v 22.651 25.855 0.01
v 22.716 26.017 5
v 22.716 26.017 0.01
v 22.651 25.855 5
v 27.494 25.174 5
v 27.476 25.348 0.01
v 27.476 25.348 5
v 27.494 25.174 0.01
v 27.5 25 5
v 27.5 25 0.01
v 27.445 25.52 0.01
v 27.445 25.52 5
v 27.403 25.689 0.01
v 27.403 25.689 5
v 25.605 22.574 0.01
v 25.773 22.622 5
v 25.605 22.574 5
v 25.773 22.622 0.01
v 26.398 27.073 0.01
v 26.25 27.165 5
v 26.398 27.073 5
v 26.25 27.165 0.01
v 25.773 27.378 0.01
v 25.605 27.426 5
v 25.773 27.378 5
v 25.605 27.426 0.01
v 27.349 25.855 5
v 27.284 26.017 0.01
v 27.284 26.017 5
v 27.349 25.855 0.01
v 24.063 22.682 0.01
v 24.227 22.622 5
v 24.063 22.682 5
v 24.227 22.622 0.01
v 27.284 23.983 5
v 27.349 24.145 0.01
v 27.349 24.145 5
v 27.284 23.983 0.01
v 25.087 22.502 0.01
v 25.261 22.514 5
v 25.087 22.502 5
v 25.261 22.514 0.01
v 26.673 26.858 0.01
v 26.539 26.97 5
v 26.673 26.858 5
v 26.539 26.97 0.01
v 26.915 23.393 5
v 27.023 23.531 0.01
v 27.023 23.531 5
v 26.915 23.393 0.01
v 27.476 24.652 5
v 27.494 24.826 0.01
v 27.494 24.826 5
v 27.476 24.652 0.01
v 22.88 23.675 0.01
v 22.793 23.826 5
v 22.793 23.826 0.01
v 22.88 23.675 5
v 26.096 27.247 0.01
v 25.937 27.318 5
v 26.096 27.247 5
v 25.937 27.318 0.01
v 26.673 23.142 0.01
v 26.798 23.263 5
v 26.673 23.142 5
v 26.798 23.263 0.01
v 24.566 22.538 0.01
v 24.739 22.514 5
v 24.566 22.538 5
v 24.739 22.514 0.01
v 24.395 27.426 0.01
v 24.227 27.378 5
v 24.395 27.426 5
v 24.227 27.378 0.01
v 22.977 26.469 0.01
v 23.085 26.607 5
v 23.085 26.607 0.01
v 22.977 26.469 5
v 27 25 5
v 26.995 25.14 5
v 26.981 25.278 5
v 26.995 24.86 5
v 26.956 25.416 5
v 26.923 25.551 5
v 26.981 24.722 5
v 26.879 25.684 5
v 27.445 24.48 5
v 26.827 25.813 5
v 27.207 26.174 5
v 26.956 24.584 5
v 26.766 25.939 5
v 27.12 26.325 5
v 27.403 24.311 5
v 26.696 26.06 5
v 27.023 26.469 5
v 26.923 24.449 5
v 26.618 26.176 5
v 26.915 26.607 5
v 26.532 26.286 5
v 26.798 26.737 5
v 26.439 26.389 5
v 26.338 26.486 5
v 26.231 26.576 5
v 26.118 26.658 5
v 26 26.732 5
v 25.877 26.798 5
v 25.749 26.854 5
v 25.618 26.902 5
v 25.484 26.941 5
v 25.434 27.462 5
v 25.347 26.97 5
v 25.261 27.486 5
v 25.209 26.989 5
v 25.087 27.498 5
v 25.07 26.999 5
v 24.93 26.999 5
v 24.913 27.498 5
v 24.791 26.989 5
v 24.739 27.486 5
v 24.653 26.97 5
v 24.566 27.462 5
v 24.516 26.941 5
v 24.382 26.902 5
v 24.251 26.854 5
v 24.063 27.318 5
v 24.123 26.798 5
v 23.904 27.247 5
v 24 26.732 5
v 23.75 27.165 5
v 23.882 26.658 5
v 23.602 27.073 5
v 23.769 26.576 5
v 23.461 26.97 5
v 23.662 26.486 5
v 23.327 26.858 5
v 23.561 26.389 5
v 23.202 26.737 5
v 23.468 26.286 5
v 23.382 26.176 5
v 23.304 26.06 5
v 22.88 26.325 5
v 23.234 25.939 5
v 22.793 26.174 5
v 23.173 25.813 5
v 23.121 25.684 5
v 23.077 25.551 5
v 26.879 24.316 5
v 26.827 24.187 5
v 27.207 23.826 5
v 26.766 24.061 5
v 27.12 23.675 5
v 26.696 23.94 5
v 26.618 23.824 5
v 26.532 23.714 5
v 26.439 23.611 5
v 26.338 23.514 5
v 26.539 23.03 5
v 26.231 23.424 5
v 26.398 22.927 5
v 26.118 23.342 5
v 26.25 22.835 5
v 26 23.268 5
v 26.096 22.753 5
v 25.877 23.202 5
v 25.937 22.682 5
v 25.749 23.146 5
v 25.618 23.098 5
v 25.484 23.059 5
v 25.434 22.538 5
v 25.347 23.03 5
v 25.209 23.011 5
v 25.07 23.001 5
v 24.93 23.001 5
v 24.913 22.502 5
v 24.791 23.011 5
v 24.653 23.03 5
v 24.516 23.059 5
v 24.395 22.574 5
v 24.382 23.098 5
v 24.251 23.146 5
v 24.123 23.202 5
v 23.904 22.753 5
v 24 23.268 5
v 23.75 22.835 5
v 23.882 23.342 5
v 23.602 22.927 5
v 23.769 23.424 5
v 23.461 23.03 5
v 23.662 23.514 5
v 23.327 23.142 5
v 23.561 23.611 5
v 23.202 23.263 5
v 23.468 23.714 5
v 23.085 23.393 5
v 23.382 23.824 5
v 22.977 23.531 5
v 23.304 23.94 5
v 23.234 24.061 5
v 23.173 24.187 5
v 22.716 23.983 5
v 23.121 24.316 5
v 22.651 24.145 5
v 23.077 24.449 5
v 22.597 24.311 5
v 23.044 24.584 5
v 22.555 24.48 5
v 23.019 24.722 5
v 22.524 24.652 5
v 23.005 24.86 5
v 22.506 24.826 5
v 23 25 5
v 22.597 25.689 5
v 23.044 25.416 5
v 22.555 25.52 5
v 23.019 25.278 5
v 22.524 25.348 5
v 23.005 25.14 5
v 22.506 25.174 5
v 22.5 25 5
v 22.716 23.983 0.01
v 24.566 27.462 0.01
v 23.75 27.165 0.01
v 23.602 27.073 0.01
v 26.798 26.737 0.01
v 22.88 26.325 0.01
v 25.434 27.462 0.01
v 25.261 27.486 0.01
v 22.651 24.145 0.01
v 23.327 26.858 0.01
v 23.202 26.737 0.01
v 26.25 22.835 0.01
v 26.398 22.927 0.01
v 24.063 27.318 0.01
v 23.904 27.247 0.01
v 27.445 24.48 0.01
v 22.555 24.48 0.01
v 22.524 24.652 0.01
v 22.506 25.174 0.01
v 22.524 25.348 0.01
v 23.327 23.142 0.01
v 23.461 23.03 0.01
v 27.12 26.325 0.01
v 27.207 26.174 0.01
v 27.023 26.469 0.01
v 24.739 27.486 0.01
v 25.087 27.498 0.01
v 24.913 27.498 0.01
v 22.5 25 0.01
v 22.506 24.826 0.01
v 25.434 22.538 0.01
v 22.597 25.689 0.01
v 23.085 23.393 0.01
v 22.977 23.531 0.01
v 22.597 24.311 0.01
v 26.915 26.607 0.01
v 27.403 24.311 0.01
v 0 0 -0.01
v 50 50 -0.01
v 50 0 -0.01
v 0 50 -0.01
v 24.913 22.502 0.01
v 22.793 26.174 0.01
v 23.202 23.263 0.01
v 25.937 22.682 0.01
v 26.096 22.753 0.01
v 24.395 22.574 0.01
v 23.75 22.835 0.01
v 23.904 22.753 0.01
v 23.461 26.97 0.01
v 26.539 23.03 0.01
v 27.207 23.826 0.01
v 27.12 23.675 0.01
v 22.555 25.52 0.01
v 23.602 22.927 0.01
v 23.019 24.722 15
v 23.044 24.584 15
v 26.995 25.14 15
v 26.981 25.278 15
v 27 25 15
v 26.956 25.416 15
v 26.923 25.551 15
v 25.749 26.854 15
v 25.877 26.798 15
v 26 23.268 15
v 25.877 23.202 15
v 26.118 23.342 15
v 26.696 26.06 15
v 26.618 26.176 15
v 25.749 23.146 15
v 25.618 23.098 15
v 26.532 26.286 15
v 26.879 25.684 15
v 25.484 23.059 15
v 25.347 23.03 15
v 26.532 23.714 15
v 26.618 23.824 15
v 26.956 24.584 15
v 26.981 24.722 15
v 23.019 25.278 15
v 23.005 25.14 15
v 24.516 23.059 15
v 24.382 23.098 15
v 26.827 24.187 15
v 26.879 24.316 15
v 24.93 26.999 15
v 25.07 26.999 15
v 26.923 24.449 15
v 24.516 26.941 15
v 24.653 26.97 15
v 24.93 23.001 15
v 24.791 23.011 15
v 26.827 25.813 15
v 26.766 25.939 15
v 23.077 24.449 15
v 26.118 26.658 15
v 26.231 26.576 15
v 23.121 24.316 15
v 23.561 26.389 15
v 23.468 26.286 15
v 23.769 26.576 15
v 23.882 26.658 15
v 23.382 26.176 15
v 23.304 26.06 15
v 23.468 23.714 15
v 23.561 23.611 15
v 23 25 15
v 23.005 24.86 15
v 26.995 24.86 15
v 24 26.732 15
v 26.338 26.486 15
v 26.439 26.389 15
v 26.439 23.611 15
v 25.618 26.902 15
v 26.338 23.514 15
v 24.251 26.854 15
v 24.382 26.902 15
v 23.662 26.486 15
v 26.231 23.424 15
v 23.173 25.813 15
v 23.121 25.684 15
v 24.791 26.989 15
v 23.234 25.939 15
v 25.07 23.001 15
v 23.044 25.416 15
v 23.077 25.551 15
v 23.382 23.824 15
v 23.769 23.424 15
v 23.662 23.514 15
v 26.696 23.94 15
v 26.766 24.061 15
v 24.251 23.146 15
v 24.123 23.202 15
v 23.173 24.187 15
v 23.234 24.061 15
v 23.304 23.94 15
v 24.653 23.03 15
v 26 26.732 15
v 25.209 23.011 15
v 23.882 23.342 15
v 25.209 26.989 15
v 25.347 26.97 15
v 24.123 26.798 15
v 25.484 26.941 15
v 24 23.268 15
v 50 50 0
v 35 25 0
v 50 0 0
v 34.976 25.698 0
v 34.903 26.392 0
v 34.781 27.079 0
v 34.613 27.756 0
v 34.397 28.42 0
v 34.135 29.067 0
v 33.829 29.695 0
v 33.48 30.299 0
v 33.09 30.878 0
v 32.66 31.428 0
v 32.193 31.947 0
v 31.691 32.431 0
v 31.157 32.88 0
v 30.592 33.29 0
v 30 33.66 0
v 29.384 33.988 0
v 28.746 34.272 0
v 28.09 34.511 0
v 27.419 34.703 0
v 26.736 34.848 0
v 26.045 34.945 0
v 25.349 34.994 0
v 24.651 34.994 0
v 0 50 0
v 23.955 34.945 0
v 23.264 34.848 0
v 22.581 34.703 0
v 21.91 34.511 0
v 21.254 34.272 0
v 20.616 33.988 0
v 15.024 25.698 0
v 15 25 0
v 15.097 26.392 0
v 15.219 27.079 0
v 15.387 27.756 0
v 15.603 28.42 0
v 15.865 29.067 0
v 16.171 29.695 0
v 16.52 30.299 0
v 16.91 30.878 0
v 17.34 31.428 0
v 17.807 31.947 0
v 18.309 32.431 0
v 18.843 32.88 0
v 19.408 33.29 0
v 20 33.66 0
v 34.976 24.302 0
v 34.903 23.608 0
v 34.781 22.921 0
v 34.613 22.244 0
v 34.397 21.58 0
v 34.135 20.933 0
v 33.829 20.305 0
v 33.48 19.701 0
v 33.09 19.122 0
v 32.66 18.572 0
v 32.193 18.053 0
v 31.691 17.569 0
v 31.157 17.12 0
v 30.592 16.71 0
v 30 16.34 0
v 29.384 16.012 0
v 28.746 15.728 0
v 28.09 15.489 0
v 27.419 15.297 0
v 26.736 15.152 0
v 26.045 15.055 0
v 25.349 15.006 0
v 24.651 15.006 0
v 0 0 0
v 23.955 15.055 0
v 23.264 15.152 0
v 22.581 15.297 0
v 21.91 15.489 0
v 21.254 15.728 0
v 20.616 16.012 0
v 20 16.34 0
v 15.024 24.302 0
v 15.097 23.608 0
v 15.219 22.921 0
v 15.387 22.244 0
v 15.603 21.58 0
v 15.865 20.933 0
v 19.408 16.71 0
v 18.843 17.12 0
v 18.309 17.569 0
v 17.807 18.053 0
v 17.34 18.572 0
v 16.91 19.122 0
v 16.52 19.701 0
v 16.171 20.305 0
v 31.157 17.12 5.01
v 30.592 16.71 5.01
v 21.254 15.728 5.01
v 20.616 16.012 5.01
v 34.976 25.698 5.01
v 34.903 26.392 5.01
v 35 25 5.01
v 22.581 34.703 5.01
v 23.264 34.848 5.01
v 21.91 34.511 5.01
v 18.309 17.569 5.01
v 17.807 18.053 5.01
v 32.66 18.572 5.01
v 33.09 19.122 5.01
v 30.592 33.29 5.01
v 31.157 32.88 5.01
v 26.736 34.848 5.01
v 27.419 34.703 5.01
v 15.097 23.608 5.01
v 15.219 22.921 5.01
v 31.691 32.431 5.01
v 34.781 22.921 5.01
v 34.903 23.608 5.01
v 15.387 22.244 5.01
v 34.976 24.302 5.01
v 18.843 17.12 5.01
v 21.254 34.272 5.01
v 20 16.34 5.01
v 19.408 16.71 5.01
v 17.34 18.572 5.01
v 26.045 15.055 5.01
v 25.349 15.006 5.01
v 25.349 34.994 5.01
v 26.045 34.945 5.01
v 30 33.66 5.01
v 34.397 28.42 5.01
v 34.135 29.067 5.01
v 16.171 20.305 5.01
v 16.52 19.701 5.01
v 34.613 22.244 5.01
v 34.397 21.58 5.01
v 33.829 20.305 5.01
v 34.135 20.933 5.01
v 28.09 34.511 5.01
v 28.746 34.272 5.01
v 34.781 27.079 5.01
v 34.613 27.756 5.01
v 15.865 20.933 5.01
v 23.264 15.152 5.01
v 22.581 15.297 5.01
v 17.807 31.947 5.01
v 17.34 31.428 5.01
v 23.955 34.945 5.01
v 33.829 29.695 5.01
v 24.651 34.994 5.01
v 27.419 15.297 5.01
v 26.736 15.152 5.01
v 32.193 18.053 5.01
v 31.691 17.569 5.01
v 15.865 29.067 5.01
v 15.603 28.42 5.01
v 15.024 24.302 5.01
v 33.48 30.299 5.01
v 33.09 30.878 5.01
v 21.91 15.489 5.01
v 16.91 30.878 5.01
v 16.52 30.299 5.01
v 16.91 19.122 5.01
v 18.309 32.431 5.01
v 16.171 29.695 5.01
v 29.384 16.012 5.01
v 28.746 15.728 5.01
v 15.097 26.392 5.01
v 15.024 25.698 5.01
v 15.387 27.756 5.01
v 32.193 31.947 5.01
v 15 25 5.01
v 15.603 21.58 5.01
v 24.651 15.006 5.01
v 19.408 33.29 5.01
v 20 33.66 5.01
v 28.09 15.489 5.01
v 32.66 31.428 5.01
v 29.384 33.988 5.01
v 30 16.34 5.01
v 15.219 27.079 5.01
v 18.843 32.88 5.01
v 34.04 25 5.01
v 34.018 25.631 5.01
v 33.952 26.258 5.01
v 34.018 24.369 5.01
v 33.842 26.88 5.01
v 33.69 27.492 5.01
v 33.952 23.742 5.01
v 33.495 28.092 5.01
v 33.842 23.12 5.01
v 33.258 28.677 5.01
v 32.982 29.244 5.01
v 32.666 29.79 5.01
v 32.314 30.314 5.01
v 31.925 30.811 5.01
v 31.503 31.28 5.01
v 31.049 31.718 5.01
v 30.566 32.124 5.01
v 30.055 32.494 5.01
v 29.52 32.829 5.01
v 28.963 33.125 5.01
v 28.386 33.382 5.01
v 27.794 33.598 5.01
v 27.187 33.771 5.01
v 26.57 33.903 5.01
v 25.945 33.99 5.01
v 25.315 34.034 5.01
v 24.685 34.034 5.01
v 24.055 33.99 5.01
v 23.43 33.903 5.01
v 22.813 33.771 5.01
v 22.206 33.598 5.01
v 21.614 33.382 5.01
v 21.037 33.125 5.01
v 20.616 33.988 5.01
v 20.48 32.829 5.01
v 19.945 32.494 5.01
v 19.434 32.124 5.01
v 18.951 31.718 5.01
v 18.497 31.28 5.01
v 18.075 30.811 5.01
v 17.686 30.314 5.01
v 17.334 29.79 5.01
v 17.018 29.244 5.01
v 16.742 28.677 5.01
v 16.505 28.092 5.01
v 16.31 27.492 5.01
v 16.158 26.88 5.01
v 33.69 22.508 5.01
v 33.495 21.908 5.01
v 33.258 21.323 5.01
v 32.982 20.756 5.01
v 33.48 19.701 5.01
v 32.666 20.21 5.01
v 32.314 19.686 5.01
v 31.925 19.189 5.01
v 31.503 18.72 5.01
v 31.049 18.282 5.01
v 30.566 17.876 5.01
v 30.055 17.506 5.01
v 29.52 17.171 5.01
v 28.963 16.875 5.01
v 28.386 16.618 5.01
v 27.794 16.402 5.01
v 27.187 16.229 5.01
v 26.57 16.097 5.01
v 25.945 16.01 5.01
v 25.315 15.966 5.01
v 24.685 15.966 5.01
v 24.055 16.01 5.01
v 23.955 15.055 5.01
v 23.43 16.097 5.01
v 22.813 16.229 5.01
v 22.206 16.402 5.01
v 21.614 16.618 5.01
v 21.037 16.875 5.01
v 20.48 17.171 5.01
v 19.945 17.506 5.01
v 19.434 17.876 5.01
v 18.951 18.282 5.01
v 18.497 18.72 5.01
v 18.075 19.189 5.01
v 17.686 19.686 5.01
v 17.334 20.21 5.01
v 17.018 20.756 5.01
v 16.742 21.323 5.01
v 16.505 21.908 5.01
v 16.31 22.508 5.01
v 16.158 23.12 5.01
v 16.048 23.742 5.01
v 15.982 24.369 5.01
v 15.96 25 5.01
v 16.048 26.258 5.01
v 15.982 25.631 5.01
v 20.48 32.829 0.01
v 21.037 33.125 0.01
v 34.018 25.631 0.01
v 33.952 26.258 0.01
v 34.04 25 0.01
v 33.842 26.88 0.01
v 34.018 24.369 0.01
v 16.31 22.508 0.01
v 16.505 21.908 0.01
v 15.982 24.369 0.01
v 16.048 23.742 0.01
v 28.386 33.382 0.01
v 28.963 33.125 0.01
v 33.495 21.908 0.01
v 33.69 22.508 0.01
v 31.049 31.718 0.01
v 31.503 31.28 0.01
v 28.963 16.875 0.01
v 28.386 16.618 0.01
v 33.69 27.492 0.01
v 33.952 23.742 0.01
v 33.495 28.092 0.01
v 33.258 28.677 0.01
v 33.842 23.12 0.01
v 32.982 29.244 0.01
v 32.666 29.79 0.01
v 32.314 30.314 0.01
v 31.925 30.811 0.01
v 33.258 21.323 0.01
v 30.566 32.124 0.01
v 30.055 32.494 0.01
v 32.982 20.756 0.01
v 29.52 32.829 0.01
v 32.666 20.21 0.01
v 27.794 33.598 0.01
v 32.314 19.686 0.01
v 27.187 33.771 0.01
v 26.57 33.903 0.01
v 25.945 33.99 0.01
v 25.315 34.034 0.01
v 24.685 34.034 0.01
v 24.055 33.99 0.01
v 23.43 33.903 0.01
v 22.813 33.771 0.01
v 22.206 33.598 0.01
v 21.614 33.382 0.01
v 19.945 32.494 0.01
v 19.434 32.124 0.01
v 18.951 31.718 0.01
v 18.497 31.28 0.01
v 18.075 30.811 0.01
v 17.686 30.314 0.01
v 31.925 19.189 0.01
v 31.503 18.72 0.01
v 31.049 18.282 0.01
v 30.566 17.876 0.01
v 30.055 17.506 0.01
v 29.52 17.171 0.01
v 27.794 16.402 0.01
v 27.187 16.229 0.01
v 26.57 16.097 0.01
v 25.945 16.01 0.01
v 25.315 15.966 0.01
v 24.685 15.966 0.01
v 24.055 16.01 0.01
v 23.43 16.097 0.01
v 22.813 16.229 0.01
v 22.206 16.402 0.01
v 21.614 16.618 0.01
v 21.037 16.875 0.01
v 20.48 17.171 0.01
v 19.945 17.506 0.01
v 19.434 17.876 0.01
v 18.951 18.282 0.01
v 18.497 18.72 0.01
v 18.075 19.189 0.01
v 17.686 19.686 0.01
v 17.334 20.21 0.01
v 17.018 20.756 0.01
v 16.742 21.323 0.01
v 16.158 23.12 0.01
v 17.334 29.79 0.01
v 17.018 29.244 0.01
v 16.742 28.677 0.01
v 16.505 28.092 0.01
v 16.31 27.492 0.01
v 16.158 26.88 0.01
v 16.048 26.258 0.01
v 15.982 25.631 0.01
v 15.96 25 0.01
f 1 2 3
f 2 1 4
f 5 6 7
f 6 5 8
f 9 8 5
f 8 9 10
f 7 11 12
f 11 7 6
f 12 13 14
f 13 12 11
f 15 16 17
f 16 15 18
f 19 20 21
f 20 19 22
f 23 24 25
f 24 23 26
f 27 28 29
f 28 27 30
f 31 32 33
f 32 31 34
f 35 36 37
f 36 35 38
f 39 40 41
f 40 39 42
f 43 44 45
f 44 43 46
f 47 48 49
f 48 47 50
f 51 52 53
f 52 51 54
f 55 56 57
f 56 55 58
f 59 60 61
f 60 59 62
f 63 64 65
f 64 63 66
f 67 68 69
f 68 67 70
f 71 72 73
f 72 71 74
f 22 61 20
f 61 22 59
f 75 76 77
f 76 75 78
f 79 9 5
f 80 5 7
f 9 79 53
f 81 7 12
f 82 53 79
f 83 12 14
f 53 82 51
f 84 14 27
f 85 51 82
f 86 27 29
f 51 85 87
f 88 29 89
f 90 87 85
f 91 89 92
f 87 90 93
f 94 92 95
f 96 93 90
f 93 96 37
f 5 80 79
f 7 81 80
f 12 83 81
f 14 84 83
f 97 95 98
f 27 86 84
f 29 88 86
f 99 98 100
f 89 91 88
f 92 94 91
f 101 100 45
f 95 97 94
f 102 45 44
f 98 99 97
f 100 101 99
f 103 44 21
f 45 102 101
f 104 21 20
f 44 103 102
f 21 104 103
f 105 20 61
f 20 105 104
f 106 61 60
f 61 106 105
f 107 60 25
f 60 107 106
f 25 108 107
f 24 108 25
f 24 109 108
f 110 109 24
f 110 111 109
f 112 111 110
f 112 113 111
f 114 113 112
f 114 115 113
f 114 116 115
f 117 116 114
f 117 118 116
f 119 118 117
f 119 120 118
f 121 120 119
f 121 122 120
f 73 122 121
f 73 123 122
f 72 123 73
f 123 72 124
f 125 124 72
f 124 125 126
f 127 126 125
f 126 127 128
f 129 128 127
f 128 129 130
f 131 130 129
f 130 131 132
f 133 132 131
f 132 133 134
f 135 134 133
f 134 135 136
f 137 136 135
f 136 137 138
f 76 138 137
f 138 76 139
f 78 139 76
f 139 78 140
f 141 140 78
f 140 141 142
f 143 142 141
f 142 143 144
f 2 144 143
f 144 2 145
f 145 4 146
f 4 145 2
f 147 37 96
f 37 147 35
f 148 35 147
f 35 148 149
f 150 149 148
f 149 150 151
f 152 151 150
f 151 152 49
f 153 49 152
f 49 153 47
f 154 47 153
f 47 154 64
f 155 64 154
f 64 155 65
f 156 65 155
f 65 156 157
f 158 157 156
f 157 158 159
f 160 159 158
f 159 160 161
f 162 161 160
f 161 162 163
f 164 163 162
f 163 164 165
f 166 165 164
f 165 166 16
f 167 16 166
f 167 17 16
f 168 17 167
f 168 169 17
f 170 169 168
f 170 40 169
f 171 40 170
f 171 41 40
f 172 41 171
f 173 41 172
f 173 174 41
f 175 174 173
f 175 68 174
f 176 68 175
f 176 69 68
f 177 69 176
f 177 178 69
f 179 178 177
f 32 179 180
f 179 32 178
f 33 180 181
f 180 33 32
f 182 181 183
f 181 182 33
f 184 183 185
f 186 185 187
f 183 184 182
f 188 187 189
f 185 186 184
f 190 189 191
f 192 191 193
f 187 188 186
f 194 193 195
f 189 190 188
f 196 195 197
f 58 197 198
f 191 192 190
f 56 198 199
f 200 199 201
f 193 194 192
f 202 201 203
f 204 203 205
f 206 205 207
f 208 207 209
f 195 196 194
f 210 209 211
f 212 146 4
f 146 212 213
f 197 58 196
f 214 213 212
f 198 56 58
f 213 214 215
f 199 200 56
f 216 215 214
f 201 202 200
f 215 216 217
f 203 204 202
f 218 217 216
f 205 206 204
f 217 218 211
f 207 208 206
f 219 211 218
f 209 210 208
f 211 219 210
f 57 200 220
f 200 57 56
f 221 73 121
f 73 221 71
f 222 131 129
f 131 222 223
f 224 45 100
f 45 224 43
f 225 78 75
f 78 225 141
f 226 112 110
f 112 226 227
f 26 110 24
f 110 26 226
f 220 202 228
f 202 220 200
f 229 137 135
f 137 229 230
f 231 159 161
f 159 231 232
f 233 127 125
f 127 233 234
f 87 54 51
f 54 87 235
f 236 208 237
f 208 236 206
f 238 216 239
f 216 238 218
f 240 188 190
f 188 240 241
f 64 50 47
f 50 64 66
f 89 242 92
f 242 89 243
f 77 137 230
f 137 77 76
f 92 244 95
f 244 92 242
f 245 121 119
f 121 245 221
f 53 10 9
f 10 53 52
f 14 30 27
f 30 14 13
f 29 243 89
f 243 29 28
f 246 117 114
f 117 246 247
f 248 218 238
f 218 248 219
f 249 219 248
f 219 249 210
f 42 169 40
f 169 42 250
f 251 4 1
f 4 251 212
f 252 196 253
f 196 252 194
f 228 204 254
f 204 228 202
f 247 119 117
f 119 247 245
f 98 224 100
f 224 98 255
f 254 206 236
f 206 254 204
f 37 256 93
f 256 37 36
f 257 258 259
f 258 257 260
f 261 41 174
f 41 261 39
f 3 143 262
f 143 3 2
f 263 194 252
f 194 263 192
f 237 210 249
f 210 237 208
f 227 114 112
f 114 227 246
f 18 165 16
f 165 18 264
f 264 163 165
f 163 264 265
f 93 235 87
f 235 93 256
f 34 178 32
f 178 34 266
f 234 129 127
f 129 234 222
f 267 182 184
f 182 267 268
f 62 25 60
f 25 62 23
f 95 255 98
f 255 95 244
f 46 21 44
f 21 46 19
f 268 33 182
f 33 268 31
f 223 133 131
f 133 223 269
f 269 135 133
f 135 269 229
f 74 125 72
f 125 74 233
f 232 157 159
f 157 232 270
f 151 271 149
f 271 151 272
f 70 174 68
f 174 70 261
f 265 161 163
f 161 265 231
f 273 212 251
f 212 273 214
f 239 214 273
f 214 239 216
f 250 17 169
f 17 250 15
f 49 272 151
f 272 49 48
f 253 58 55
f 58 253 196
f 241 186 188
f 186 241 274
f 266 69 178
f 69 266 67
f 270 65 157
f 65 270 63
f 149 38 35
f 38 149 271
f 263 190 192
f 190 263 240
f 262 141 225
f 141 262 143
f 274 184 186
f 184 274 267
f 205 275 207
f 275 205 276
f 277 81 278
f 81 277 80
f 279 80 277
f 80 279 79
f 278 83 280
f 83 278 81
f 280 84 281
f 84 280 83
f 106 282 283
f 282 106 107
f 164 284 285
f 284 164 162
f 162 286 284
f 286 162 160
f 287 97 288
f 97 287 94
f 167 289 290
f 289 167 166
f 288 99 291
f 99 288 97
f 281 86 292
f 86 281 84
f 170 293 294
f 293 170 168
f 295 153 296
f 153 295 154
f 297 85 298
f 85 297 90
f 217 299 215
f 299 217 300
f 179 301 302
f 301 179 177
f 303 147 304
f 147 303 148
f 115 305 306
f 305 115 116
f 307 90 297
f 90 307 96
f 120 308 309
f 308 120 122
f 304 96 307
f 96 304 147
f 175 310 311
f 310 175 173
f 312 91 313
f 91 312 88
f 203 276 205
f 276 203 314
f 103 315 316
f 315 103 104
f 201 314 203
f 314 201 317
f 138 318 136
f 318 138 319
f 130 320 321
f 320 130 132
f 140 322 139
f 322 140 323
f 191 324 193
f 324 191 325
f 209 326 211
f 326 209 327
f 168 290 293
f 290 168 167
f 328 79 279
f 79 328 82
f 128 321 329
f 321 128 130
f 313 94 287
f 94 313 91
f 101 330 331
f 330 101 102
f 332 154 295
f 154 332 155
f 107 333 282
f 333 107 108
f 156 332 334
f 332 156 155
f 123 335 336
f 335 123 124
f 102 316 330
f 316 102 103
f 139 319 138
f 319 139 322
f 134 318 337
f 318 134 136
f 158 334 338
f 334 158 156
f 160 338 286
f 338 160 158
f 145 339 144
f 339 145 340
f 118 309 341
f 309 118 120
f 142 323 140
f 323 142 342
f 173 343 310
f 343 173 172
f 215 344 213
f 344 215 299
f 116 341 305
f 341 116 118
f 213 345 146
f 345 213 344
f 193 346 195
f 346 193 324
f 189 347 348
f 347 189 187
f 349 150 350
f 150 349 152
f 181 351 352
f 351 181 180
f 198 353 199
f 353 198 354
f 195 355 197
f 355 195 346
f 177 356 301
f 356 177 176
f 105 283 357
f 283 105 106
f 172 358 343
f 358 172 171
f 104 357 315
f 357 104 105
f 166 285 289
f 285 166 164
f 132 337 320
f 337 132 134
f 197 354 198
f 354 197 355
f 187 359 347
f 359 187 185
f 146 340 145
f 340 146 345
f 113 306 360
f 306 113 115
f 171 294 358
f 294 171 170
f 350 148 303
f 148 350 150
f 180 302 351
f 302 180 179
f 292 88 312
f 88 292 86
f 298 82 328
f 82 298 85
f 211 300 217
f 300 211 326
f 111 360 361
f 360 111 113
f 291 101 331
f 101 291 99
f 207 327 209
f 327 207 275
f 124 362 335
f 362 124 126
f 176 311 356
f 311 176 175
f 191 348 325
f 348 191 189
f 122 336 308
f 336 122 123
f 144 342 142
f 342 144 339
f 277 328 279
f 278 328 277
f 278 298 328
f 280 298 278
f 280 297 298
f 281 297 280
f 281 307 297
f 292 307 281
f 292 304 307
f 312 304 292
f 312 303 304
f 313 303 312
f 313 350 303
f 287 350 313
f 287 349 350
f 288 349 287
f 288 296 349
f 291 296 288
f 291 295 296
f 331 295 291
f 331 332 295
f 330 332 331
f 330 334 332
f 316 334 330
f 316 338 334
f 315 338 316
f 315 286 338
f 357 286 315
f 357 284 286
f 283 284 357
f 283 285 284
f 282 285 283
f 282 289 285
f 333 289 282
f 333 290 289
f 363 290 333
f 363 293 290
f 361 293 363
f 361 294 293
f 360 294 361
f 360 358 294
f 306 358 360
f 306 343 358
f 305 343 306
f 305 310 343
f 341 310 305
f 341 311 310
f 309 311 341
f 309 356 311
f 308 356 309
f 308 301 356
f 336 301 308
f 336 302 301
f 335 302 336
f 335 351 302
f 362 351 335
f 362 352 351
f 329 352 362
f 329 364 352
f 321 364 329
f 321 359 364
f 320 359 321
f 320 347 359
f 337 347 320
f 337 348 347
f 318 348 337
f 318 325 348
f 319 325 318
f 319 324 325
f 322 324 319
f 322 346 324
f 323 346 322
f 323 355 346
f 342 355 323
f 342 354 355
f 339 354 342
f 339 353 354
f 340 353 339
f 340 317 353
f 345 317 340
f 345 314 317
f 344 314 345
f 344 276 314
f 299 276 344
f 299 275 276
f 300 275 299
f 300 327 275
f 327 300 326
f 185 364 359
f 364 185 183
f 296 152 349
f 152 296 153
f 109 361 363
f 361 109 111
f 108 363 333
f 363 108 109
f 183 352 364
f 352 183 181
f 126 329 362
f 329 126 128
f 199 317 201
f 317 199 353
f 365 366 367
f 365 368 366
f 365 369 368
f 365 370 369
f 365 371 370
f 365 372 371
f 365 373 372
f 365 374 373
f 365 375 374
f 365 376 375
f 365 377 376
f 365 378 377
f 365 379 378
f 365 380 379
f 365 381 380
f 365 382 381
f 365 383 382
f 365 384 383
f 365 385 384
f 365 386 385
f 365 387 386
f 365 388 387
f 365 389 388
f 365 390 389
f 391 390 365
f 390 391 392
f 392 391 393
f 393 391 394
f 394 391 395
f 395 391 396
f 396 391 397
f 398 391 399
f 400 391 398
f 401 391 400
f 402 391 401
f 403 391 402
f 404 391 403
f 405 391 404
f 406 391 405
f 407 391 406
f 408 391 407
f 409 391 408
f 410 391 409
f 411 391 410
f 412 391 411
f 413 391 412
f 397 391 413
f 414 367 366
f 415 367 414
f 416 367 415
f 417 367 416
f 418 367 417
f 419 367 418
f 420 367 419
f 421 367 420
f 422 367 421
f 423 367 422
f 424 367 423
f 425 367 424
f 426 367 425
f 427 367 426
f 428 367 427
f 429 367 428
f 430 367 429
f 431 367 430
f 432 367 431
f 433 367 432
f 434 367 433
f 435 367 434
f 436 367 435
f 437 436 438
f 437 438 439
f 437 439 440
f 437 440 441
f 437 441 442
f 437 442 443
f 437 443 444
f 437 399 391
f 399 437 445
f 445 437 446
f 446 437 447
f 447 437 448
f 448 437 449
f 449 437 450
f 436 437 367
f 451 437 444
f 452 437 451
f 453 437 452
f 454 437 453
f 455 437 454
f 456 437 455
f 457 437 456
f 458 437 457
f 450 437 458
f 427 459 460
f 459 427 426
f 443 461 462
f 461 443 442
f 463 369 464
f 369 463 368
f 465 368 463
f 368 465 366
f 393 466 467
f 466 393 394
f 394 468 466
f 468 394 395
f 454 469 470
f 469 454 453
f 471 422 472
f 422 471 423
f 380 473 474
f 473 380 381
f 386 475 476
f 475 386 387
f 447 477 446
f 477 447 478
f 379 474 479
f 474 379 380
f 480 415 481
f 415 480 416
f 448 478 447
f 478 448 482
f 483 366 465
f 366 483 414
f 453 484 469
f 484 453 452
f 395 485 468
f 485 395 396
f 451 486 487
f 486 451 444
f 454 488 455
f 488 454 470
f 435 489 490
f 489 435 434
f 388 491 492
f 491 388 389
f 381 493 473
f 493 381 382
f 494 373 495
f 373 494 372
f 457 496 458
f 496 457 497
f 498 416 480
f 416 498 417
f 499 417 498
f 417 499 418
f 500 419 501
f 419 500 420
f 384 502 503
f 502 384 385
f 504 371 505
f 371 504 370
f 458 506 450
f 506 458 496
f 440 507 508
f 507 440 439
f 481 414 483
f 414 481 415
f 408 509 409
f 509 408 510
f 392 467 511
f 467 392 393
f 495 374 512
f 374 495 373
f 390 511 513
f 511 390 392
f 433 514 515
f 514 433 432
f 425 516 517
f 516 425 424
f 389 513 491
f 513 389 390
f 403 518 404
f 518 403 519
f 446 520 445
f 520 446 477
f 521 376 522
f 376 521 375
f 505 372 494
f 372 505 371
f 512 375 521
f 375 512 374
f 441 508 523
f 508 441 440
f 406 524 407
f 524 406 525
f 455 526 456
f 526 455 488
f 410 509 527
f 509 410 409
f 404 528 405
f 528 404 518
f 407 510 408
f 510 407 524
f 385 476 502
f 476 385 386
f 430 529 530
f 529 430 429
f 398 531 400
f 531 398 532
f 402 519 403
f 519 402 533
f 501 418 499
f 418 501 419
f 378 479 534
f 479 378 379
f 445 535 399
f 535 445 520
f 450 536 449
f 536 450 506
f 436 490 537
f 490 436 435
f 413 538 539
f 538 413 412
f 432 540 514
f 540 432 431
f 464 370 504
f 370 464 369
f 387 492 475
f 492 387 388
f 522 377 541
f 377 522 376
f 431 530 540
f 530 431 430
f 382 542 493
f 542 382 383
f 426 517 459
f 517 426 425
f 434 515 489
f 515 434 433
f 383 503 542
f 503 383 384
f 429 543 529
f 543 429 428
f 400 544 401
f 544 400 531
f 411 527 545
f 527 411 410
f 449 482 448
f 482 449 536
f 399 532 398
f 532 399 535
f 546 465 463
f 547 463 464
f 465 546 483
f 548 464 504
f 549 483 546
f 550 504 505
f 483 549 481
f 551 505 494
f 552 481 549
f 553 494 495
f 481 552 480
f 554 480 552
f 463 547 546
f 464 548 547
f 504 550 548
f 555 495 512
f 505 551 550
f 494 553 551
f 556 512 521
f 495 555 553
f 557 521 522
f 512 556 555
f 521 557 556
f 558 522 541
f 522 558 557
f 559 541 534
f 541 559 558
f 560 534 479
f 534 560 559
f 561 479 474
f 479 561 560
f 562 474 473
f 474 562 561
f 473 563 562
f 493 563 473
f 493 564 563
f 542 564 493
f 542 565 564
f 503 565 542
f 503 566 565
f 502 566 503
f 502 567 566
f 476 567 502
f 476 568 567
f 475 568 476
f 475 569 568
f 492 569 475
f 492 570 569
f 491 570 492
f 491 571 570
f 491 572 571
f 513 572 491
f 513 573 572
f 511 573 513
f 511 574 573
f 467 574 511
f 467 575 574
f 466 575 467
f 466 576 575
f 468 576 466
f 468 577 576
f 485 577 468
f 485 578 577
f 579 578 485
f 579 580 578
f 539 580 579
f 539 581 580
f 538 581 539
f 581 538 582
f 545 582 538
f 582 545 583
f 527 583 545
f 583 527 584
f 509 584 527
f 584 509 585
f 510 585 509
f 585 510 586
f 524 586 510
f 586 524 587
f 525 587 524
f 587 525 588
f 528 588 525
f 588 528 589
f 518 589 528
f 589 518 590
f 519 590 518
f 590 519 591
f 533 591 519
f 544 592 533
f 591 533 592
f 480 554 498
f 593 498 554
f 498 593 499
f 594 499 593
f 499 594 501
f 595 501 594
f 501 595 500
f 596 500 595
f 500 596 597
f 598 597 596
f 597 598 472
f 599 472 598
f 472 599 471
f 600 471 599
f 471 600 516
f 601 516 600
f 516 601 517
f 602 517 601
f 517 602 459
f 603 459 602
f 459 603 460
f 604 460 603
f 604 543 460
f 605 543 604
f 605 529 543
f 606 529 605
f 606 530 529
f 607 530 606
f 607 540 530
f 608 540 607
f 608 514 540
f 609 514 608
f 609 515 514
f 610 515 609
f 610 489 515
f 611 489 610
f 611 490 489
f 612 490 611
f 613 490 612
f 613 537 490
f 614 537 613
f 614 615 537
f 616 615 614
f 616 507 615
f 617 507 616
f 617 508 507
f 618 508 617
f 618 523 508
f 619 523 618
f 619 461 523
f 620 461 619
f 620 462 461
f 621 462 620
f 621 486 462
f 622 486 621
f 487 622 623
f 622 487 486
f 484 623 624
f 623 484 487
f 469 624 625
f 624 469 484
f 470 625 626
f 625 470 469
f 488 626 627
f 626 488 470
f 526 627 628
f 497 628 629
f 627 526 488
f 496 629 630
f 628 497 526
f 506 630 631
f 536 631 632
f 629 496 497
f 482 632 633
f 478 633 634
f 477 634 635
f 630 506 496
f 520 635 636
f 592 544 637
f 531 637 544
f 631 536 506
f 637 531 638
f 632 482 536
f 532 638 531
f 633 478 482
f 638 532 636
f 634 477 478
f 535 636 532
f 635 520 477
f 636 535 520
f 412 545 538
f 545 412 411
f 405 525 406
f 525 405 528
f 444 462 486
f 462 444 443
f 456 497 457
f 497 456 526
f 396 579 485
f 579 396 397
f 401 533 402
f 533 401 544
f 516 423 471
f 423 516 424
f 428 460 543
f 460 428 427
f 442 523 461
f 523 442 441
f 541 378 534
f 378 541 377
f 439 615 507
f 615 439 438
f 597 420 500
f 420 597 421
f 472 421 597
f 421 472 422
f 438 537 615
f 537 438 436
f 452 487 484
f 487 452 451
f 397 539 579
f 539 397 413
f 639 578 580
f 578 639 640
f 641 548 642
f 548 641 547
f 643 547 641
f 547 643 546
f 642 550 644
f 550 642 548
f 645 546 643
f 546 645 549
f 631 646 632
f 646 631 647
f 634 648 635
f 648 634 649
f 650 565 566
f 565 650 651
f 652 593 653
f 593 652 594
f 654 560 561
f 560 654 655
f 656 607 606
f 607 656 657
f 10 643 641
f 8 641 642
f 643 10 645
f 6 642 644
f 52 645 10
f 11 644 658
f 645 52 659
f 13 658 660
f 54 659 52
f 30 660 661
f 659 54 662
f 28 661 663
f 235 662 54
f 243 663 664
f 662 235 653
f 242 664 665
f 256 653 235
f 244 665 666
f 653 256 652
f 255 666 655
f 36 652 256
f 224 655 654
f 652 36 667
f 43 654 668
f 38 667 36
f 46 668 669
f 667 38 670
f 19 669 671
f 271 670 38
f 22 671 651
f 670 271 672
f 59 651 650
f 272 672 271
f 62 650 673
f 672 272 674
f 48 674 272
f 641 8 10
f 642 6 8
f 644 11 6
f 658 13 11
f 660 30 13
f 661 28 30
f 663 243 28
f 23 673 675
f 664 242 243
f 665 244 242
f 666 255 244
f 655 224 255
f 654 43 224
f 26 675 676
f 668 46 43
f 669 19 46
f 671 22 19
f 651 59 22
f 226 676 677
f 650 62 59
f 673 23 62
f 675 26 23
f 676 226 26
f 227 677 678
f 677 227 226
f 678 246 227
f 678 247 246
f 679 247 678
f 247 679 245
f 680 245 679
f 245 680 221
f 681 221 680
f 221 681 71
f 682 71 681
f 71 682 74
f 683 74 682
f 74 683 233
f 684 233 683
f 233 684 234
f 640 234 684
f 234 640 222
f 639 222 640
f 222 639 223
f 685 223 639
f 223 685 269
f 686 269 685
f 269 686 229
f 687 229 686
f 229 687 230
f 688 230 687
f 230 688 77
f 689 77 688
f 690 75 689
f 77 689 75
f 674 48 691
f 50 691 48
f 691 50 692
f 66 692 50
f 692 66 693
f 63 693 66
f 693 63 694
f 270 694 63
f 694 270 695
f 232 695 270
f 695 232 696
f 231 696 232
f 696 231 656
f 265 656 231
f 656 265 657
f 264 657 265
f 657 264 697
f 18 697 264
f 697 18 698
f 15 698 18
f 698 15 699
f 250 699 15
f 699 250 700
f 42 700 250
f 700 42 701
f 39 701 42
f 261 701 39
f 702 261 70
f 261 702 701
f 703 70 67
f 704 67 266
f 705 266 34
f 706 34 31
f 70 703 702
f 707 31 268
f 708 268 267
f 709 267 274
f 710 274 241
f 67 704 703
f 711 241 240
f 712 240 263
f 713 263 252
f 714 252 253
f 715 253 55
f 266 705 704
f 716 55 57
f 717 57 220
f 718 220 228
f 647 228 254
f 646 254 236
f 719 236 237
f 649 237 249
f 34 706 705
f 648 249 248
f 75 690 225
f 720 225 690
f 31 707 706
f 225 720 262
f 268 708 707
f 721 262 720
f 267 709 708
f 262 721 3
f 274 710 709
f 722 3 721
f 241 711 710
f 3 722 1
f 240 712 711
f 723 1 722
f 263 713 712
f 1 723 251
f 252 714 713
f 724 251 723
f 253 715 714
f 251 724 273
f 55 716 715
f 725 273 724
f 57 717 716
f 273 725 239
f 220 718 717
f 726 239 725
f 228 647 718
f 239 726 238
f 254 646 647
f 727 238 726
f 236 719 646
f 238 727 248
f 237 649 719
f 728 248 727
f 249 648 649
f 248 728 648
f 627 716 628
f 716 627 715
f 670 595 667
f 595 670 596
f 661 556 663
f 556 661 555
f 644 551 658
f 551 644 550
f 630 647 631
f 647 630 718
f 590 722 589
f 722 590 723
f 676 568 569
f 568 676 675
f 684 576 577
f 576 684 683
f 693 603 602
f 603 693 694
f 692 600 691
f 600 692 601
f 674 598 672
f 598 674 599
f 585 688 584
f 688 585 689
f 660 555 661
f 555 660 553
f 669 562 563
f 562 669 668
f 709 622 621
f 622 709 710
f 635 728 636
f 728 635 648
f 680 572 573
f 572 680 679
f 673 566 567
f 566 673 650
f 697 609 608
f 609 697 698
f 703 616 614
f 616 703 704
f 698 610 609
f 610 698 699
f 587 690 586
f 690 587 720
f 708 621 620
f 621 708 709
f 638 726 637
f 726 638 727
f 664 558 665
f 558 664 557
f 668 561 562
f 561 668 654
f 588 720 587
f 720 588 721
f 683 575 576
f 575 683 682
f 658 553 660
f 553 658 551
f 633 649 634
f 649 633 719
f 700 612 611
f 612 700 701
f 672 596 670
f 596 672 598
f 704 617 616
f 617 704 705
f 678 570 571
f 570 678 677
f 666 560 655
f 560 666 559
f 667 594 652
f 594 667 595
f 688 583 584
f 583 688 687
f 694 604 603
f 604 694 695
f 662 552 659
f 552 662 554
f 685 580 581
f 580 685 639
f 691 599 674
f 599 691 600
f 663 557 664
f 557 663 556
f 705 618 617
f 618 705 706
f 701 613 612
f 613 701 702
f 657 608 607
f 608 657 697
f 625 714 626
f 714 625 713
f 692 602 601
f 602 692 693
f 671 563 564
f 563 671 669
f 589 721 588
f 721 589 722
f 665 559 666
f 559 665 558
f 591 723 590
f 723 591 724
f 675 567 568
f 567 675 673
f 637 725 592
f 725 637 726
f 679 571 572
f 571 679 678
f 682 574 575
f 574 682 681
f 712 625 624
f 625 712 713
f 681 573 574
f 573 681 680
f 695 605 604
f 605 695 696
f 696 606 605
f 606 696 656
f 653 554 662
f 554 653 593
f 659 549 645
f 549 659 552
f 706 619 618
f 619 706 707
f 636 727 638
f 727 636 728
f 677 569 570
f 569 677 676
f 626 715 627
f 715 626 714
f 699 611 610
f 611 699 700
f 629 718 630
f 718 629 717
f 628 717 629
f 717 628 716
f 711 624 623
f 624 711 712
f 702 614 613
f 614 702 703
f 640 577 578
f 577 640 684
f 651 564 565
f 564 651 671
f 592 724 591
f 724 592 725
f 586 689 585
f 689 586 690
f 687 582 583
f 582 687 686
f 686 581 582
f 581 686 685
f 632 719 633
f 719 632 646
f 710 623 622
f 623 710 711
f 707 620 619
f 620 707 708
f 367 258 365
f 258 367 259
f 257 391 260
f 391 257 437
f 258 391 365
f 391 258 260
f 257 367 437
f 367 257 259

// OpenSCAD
// file: ../Base/PlacementOptions.scad
// Fischertechnik Box Foundation
// Placement Options

// Alignment
NoAlign = 0;
AlignLeft = 1;
AlignBottom = 2;
AlignCenter = 3;
AlignRight = 4;
AlignTop = 5;

// Element rotation degree steps
rotations = [0, -90, -180, -270];

// Rotation
NoRotation = 0;
Rotate0 = 0;
Rotate90 = 1;
Rotate180 = 2;
Rotate270 = 3;

// Docking (seen from above)
NoDock = -1;
DockLeft = 0;
DockTop = 1;
DockRight = 2;
DockCorner = 2;
DockBottom = 3;

// Web corners
LowerLeft = 0;
UpperLeft = 1;
UpperRight = 2;
LowerRight = 3;

// Web position relative to corner
LeftOfCorner = 0;
RightOfCorner = 1;
// file: ../Base/Boxes.scad
// Fischertechnik Box Foundation
// Pre-designed Boxes

use <Constants.scad>

include <PlacementOptions.scad>

box190Width = 190;
box190Depth = 130;
box130Width = 130;
box130Depth = 95;
boxUsageHeight = 33.9;
boxWallThickness = 2.4;
boxBaseThickness = 1.0;
boxWebWidth = 3.0;

// getBoxWallThickness()
// Gets the wall thickness of a Fischertechnik Box

function getBoxWallThickness() = boxWallThickness;

// Gets the usable height of a fischertechnik box
function getBoxUsageHeight() = boxUsageHeight;

// Gets the thickness of the Fischertechnik box base.
function getBoxBaseThickness() = boxBaseThickness;

// Gets the width of a box web
function getBoxWebWidth() = boxWebWidth;

// Gets the usable inner space of a Box 190 as an x/y-list
function getBox190Space() = [
    box190Width - 2*getBoxWallThickness(), 
    box190Depth - 2*getBoxWallThickness() ];

// Imports the Fischertechnik empty box 130x190 mm and places it at position 0,0
// 190x130 are the outer sizes, the inner space is slightly smaller. Use getBox190Space() to get the inner sizes.
// This module needs the STL file "Fischertechnik Box 130x190.stl" in the library path.
// The box is positioned that the usable inner space is at the 0,0,0 position. The

module Box190() {
    translate([-getBoxWallThickness(),-getBoxWallThickness(),-getBoxBaseThickness()])
        import("Fischertechnik Box 130x190.stl", convexity=3);
}

// Gets the usable inner space of a Box 130 as an x/y-list
function getBox130Space() = [
    box130Width - 2*getBoxWallThickness(), 
    box130Depth - 2*getBoxWallThickness() ];

// Imports the Fischertechnik empty box 95x130 mm and places it at position 0,0
// 190x130 are the outer sizes, the inner space is slightly smaller. Use getBox190Space() to get the inner sizes.
// This module needs the STL file "Fischertechnik Box 95x130.stl" in the library path.
// The box is positioned that the usable inner space is at the 0,0,0 position. The

module Box130() {
    translate([-getBoxWallThickness(),-getBoxWallThickness(),-getBoxBaseThickness()])
        import("Fischertechnik Box 95x130.stl", convexity=3);
}

// Creates a web at the specified box walls
// corner 0 = LowerLeft, 1 = UpperLeft, 2 = UpperRight, 3 = LowerRight
// side 0 = LeftOfCorner, 1 = RightOfCorner
// distance = Distance in mm from the corner
// box = inner width and depth of the box (default: Box 190)
// webWidth = length of the web (default is 3 mms)
// webThickness = thickness of the web (default is 1 mm)

module BoxWeb(corner, side, distance, box=getBox190Space(), webWidth=getBoxWebWidth(), webThickness=1.0) {
    sink = getBoxWallThickness()/2;

    width = (corner % 2 == 0) ? 
            (side == LeftOfCorner ? webWidth : webThickness) :
            (side == LeftOfCorner ? webThickness : webWidth);

    depth = (corner % 2 == 0) ? 
            (side == RightOfCorner ? webWidth : webThickness) :
            (side == RightOfCorner ? webThickness : webWidth);
    
    xDiff = corner == LowerLeft ? 
                (side == LeftOfCorner ? -sink : distance) :
            (corner == UpperLeft ?                
                (side == LeftOfCorner ? distance : -sink) :
            (corner == UpperRight ?
                (side == LeftOfCorner ? box.x-webWidth+sink : box.x-distance-webThickness) :
                (side == LeftOfCorner ? box.x-distance-webThickness: box.x-webWidth+sink)));

    yDiff = corner == LowerLeft ? 
                (side == RightOfCorner ? -sink : distance) :
            (corner == UpperLeft ?
                (side == RightOfCorner ? box.y-distance : box.y-webWidth+sink) :
            (corner == UpperRight ?
                (side == RightOfCorner ? box.y-webWidth+sink : box.y-distance) :
                (side == RightOfCorner ? distance : -sink)));
    
    translate([xDiff, yDiff, -getExcess()])
        cube([width, depth, boxUsageHeight + 2*getExcess()]);
}
// file: ../Base/Rotation.scad
// Fischertechnik Box Foundation
// Geometry Helpers Rotation

include <PlacementOptions.scad>

// getRotatedSpace(space, rotation=NoRotation)
// Rotates the space dependent on the specified rotation

function getRotatedSpace(space, rotation=NoRotation) = [
    (rotation == Rotate90 || rotation == Rotate270) ? space.y : space.x,
    (rotation == Rotate90 || rotation == Rotate270) ? space.x : space.y
];

// Rotates the given space around the fixed left lower corner
// space = the space the children needs as width/depth list [width,depth]
// rotation = 0 Rotate0 degrees, 1 Rotate90 degrees, 2 Rotate180 degrees, 3 Rotate270 degrees (equivalent to -90)

module RotateFix(space, rotation=Rotate0) {
    dy = (rotation == Rotate0 || rotation == Rotate270) ? 0 :
        (rotation == Rotate90) ? space.x :
        space.y;
    dx = (rotation < Rotate180) ? 0 :
        (rotation == Rotate180) ? space.x :
        space.y;
    
    translate([dx, dy, 0])
        rotate([0, 0, rotations[rotation]])
            children();
}
// file: ../Base/Alignment.scad
// Fischertechnik Box Foundation
// Geometry Helpers Alignment

include <PlacementOptions.scad>

// getAlignedX(elementWidth, spaceWidth, align=AlignRight, offset=0)
// Gets the aligned X offset of an element with the given
// width in the given space.
// elementWidth = The width of the element to positon
// spaceWidth = The space where the element should be aligned
// align = 0 AlignLeft, 1 AlignCenter, 2 AlignRight
// offset = an optional offset from the aligned position. When
// aligned left or centered, then positive values are in X direction.
// When aligned right then positive values are in negative X direction.

function getAlignedX(elementWidth, spaceWidth, align=AlignRight, offset=0) =
    (align == AlignLeft) ?
        offset :
        ((align == AlignCenter) ?
        (spaceWidth - elementWidth)/2 + offset :
        spaceWidth - offset - elementWidth);

// getAlignedY(elementDepth, spaceDepth, align=AlignTop, offset=0)
// Gets the aligned Y offset of an element with the given
// depth in the given space.
// elementDepth = The depth of the element to positon
// spaceDepth = The space where the element should be aligned
// align = 0 AlignBottom, 1 AlignCenter, 2 AlignTop
// offset = an optional offset from the aligned position. When
// aligned bottom or centered, then positive values are in Y direction.
// When aligned top then positive values are in negative Y direction.

function getAlignedY(elementDepth, spaceDepth, align=AlignTop, offset=0) =
    (align == AlignBottom) ?
        offset :
        ((align == AlignCenter) ?
        (spaceDepth - elementDepth)/2 + offset :
        spaceDepth - offset - elementDepth);
// file: AxisHub.scad
// Fischertechnik Box Library
// Axis for hub
// 31014

use <../Base/Constants.scad>
use <../Base/Placement.scad>
use <../ModelBase/Simple.scad>

width = 30;
depth = 30;

// getAxisHubSpace()
// Gets the space the axis hub needs as width and depth (.x and .y as a list)

function getAxisHubSpace() = [width, depth];

// AxisHub()
// Axis to stick a standard hub on it. This needs
// a 30x30 mm rectangle in the box. To support the placement
// the axis has a thin and sinked 30x30 mm base plate.

module AxisHub() {
    axisHeight = 15;
    tubeHeight = 5;
    tubeDiameter = 20;

    LeveledAxisWithSpace(axisHeight, tubeHeight, getAxisHubSpace());
    
    Center(getAxisHubSpace())
        Tube(tubeHeight, outerDiameter=tubeDiameter);
}

// Tests
color("lightgray") {
AxisHub();
}
// file: ../Base/Placement.scad
// Fischertechnik Box Foundation
// Geometry Helpers Placement

use <Constants.scad>
use <Alignment.scad>
use <Rotation.scad>
use <Boxes.scad>

include <PlacementOptions.scad>

// Place(x=0, y=0, elementSpace=[0,0], alignX=AlignLeft, alignY=AlignBottom, rotation=Rotate0, boxSpace=getBox190Space())
// Places the child at the specified position
// y = Y-Position. This is a relative position when an X aligment is specified.
// x = X-Position. This is a relative position when an Y aligment is specified.
// elementSpace = space of the element to be placed [x,y]
// alignX = -1=NoAlign, 0 AlignLeft, 1 AlignCenter, 3 AlignRight (elementSpace and boxSpace required!)
// alignY = -1=NoAlign, 2 AlignBottom, 1 AlignCenter, 4 AlignTop (elementSpace and boxSpace required!)
// rotation = 0 Rotate0 0 degrees, 1 Rotate90 90 degrees, 
// 2 Rotate180 180 degrees, 3 Rotate270 270 degrees (equivalent to -90)
// boxSpace = Inner space of the box where the placement occurs [x,y] - default is Box 190x130 inner space

module Place(x=0, y=0, elementSpace=[0,0], 
  alignX=AlignLeft, alignY=AlignBottom, 
  rotation=NoRotation, boxSpace=getBox190Space()) {

    module Position(x, y, space, rotation=Rotate0) {
        translate([x, y, 0])
            RotateFix(space, rotation)
                children();
    }

    space = getRotatedSpace(elementSpace, rotation);
    alignedX = getAlignedX(space.x, boxSpace.x, alignX, x);
    alignedY = getAlignedY(space.y, boxSpace.y, alignY, y);
    Position(alignedX, alignedY, elementSpace, rotation)
        children();
}

// Center(space=getBox130Space(), elementSpace=[0,0])
// space = Space where the children is centered. For cylinder use centered=true and no elementSpace.
// elementSpace = space of the element to be centered [x,y]

module Center(space=getBox190Space(), elementSpace=[0,0]) {
    translate([(space.x - elementSpace.x) / 2, (space.y - elementSpace.y) / 2])
        children(0);
}

// CenterHorizontal(width=0, y=0, offset=0, space=getBox130Space())
// space = Space where the children is centered. For cylinder use centered=true and no elementSpace.
// elementSpace = space of the element to be centered [x,y]

module CenterHorizontal(width=0, y=0, offset=0, space=getBox190Space()) {
    translate([(space.x - width) / 2 + offset, y])
        children(0);
}

// CenterVertical(depth=0, x=0, offset=0, space=getBox130Space())
// space = Space where the children is centered. For cylinder use centered=true and no elementSpace.
// elementSpace = space of the element to be centered [x,y]

module CenterVertical(depth=0, x=0, offset=0, space=getBox190Space()) {
    translate([x, (space.y - depth) / 2 + offset])
        children(0);
}
// file: ../Base/Constants.scad
// Fischertechnik Box Foundation
// Constants

// Constant values necessary for multiple elements

// Base constants
dividerThickness = 1.2;
excess = 0.01;
fragments = 90;
tolerance = 0.8;

// Gets the thickness of a divider 
function getDividerThickness() = dividerThickness;

// Gets the excess that is used to merge walls into each other
function getExcess() = excess;

// Gets amount of fragments of a cylinder
function getFragments() = fragments;

// Gets the inner tolerance of a frame to each side
function getTolerance() = tolerance;


// Fischertechnik specific constants
axisDiameter = 4;
axisBottomDiameter = axisDiameter + 1;
standardEdgeDistance = 2.5;
standardWebDistance = 11.5;
standardCornerLength = 15;
tubeWallFactor = 0.8;

// Gets axis diameter
function getAxisDiameter() = axisDiameter;

// Gets axis bottom diameter for thicker part at the bottom
function getAxisBottomDiameter() = axisBottomDiameter;

// gets the standard distance to the wall of the box for dockable frames with webs
function getStandardEdgeDistance() = standardEdgeDistance;

// gets the standard distance of each web to the corner of the dockable frame
function getStandardWebDistance() = standardWebDistance;

// gets the standard length of the corner walls of a dockable frame
function getStandardCornerLength() = standardCornerLength;

// gets the wall thickness of a tube.
function getTubeWallThickness() = tubeWallFactor * getDividerThickness();
// main file
// Fischertechnik Box Library
// Cylinder and axis for hub with gear wheel Z30
// 31014 and 36264

use <../Base/Constants.scad>
use <../Base/Placement.scad>
use <../ModelBase/Simple.scad>

use <AxisHub.scad>

width = 50;
depth = 50;

// getAxisHubWithZ30()
// Gets the space the cylinder for a hub with a Z30 needs as width and depth (.x and .y as a list)

function getAxisHubWithZ30Space() = [width, depth];

// AxisHubWithZ30()
// Standing cylinder and axis for a hub with Z30.
// 31014 and 36264

module AxisHubWithZ30() {
    Space(getAxisHubWithZ30Space());
        
    Center(elementSpace=getAxisHubSpace(), space=getAxisHubWithZ30Space())
        AxisHub();
}

// Tests
color("lightgray")
AxisHubWithZ30();
